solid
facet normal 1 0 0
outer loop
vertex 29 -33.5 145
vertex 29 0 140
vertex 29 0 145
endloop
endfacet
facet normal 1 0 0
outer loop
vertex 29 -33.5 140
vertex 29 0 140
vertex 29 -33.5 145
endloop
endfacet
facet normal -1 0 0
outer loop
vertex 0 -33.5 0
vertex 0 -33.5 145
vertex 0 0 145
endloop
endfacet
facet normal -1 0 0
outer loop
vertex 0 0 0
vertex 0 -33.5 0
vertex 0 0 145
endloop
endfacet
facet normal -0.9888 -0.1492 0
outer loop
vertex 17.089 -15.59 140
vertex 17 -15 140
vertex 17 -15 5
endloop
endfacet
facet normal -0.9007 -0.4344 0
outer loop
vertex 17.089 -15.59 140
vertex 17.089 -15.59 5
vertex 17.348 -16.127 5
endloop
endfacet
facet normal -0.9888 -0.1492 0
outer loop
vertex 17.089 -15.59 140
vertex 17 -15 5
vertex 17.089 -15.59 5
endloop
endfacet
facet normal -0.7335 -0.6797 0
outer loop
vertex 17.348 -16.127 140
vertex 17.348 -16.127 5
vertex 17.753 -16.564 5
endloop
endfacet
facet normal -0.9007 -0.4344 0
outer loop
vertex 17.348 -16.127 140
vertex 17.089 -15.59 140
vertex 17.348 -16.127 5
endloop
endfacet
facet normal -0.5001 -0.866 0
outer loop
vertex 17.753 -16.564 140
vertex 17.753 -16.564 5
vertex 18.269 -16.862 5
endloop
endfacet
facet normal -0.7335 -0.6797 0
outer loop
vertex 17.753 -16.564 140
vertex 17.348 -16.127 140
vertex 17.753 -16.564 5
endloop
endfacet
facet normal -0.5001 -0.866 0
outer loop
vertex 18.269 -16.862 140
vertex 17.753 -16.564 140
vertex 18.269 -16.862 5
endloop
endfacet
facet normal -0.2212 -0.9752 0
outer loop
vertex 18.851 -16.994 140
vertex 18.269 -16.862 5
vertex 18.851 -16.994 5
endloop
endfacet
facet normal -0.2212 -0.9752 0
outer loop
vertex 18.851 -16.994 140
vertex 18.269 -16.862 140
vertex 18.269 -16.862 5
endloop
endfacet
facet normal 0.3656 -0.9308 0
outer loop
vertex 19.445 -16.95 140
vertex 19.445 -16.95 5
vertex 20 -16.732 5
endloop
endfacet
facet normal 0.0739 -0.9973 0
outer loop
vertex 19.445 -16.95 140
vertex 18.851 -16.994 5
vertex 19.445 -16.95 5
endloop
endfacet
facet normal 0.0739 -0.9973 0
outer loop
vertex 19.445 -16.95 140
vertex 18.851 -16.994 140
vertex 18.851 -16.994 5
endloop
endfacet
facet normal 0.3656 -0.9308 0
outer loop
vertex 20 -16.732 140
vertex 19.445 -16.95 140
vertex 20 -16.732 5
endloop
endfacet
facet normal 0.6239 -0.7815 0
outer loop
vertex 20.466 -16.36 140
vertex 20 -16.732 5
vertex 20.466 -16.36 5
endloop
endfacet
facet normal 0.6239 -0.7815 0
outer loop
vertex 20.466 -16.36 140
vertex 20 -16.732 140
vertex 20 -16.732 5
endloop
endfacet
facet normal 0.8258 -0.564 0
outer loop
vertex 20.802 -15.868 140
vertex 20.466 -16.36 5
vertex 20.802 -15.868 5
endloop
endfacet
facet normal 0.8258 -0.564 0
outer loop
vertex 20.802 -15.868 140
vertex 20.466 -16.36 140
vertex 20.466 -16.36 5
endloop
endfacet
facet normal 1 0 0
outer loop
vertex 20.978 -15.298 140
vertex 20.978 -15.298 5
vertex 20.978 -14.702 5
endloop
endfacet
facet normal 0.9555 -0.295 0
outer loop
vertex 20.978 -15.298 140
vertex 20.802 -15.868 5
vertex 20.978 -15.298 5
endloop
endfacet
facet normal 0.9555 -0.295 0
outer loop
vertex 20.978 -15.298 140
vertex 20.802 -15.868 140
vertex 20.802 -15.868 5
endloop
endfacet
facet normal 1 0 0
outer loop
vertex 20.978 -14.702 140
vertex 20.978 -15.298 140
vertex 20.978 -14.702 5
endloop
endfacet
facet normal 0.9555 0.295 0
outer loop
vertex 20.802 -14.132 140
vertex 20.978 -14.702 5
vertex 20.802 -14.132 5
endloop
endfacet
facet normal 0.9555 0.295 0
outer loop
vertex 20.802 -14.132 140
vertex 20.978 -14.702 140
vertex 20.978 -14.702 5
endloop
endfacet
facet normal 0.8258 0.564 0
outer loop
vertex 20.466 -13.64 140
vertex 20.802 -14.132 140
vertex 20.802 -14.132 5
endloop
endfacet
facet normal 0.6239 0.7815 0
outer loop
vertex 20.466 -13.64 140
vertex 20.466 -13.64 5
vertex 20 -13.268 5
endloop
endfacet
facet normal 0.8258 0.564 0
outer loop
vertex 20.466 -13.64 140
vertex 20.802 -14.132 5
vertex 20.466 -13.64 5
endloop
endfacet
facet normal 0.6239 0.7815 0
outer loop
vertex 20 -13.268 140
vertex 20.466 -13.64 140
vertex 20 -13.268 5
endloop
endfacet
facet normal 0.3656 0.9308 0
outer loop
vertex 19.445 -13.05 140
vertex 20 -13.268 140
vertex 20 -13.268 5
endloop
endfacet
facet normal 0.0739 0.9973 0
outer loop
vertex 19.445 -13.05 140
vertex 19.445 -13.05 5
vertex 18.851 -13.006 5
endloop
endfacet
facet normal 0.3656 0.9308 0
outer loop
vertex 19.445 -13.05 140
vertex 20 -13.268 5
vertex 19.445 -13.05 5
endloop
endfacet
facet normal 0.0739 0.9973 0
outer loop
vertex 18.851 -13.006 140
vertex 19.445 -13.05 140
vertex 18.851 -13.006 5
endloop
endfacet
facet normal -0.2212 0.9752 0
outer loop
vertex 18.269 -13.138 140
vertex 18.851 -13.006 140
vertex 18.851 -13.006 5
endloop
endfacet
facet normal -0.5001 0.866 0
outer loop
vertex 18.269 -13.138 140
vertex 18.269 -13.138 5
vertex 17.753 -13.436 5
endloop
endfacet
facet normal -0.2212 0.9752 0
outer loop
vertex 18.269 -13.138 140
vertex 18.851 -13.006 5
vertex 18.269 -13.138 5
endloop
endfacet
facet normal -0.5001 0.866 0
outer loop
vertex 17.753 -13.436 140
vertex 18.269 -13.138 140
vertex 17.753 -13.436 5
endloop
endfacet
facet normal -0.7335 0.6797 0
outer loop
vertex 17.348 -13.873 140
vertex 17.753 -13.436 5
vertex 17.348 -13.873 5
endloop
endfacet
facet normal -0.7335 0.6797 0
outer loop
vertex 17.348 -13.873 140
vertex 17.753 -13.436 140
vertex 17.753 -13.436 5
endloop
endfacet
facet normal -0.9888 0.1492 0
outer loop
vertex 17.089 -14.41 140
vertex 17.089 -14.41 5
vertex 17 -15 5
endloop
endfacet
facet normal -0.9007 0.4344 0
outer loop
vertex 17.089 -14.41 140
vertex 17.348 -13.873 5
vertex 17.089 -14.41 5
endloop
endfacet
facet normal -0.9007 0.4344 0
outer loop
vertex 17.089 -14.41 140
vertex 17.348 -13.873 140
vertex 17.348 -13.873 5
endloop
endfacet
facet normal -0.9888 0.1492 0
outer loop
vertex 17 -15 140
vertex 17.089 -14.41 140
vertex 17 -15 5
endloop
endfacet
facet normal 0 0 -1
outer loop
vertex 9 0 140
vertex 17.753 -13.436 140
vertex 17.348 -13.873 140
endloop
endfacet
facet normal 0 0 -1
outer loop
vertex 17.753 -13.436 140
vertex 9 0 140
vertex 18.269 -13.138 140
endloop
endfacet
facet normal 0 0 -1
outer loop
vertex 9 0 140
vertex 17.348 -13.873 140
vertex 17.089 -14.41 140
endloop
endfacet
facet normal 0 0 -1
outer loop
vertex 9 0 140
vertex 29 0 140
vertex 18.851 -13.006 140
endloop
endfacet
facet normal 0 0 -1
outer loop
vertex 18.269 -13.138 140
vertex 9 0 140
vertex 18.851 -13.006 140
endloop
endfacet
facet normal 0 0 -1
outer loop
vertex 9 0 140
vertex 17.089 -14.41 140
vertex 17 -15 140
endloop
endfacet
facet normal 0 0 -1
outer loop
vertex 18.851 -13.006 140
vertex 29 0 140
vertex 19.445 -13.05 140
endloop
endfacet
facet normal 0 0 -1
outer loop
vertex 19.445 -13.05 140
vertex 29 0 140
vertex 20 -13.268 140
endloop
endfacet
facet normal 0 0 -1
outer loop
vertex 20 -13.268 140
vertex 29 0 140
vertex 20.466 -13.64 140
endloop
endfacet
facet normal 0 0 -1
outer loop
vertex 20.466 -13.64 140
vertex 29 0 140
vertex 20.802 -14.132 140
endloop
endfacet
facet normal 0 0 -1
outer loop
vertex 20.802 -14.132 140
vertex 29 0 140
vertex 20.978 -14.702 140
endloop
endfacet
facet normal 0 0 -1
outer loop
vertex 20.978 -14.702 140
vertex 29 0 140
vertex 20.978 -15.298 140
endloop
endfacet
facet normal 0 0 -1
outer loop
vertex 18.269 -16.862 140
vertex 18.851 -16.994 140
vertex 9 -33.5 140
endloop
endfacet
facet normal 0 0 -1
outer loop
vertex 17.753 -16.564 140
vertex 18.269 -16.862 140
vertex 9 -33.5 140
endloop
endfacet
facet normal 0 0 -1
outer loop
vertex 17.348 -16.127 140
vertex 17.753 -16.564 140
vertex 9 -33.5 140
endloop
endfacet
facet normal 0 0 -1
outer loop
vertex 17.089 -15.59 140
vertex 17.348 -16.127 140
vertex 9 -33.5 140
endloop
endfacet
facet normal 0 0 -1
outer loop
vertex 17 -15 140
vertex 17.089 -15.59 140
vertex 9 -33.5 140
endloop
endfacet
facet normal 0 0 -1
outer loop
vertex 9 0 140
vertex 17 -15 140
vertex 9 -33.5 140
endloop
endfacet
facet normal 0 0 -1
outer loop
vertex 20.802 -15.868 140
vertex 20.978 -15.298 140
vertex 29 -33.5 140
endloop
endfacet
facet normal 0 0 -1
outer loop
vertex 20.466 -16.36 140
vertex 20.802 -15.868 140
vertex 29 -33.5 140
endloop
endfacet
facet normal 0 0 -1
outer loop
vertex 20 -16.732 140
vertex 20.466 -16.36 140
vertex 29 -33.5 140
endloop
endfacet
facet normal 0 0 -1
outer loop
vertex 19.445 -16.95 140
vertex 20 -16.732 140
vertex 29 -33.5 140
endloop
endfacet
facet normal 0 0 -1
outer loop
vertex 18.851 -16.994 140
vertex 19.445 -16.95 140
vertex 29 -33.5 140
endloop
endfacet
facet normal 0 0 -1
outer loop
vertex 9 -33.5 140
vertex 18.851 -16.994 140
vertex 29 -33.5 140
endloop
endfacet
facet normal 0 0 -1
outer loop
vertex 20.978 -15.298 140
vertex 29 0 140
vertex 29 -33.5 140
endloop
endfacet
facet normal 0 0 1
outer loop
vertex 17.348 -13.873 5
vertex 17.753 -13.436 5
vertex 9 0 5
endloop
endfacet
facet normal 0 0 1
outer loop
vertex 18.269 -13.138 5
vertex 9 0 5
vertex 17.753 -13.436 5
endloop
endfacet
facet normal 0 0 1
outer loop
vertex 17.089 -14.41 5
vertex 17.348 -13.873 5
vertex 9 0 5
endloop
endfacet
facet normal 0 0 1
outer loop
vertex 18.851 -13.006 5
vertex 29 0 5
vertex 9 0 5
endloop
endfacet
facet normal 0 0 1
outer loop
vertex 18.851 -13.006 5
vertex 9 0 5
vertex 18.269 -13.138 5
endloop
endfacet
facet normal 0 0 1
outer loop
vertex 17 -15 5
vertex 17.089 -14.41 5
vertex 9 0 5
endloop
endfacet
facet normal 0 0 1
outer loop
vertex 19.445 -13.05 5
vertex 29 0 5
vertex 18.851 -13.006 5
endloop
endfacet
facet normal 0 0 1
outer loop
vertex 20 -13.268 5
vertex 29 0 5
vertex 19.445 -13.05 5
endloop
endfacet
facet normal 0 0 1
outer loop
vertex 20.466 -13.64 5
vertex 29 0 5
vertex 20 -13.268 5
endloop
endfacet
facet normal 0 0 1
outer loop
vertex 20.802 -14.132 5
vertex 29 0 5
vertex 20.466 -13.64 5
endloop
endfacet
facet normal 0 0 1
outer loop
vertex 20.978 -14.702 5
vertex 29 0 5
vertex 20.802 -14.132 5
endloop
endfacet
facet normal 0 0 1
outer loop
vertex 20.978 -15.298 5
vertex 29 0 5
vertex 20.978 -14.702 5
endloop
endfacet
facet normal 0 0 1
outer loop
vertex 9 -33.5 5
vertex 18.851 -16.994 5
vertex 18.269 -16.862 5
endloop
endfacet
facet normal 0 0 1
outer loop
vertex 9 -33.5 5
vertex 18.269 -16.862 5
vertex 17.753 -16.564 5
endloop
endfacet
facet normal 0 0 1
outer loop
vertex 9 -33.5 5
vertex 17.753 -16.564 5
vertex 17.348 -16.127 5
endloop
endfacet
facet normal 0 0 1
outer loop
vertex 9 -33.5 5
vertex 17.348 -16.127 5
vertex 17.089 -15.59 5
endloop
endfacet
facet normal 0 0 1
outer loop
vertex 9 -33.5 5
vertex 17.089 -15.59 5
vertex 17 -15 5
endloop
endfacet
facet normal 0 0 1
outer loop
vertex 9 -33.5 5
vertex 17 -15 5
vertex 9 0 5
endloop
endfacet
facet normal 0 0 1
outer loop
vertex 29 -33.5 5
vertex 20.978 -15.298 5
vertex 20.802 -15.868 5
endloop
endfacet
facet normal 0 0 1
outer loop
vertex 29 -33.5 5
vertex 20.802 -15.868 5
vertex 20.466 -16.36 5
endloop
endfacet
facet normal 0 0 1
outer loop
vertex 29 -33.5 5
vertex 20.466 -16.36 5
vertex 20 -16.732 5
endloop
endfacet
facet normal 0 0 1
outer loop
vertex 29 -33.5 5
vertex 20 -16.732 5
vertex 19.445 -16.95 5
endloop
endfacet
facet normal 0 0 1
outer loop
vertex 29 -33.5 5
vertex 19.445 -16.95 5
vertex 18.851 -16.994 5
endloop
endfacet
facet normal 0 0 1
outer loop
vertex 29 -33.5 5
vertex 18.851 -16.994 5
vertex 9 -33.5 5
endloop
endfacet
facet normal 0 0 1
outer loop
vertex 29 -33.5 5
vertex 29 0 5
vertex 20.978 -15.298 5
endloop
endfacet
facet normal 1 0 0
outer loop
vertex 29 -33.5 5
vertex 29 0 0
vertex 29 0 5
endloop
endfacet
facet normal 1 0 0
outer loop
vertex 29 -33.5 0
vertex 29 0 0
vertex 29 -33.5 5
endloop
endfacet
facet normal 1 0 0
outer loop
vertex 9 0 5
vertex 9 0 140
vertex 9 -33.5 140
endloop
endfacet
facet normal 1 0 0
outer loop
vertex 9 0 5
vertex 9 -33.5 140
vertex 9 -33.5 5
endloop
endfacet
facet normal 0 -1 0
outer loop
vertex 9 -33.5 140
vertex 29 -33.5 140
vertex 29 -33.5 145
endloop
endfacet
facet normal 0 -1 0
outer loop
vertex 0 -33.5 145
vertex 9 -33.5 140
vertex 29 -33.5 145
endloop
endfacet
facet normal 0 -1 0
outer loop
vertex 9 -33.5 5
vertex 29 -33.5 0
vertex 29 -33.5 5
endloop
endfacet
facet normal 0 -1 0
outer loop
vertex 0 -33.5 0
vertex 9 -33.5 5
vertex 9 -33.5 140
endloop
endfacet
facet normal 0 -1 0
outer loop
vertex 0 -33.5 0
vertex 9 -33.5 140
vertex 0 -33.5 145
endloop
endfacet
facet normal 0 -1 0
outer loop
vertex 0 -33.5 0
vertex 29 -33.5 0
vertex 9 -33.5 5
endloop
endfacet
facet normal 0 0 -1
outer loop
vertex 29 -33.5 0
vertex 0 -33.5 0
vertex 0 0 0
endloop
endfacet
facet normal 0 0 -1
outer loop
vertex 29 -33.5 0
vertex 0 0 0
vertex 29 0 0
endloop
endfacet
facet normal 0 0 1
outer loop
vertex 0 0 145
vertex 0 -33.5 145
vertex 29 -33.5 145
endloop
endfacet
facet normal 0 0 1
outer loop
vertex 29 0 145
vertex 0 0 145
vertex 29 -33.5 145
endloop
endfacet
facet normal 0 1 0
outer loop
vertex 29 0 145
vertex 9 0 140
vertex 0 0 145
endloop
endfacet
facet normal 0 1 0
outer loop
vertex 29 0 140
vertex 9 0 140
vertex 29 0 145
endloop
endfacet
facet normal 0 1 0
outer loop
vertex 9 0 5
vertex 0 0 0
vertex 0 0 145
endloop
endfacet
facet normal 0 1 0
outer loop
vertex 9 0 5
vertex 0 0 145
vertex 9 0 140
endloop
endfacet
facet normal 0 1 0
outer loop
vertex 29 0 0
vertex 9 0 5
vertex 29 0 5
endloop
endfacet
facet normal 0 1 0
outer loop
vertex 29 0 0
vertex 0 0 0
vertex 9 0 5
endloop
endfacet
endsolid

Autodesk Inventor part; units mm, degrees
ref_plane "YZ Plane" through (0, 0, 0) normal (1, 0, 0) x (0, 1, 0)
ref_plane "XZ Plane" through (0, 0, 0) normal (0, 1, 0) x (-1, 0, 0)
ref_plane "XY Plane" through (0, 0, 0) normal (0, 0, 1) x (1, 0, 0)
sketch "스케치1" plane through (0, 0, 0) normal (0, 0, 1) x (1, 0, 0)
  line L0 (0, 0) -> (29, 0)
  line L1 (29, 0) -> (29, -33.5)
  line L2 (29, -33.5) -> (0, -33.5)
  line L3 (0, -33.5) -> (0, 0)
  dimension "d0" = 29
  dimension "d1" = 33.5
extrude "돌출1" add sketch "스케치1" along normal blind 145
sketch "스케치2" plane through (29, -33.5, 0) normal (1, 0, 0) x (0, 0, -1)
  line L0 (0, 0) -> (0, 33.5) projected
  line L1 (0, 33.5) -> (-145, 33.5) projected
  line L2 (-145, 0) -> (-145, 33.5) projected
  line L3 (0, 0) -> (-145, 0) projected
  line L4 (-140, 33.5) -> (-140, 0)
  line L5 (-5, 33.5) -> (-5, 0)
  dimension "d4" = 5
  dimension "d5" = 5
extrude "돌출2" cut sketch "스케치2" against normal blind 20 contours L3 L4 L1 L5
sketch "스케치3" plane through (29, -33.5, 140) normal (0, 0, -1) x (-1, 0, 0)
  line L0 (0, 0) -> (0, 33.5) projected
  line L1 (20, 0) -> (0, 0) projected
  line L2 (20, 0) -> (20, 33.5) projected
  line L3 (0, 33.5) -> (20, 33.5) projected
  circle A0 centre (10, 18.5) radius 2
  point P0 (29, 33.5)
  dimension "d8" = 4
  dimension "d9" = 10
  dimension "d10" = 18.5
extrude "돌출3" add sketch "스케치3" along normal up to surface (135 mm away) contours A0
properties part number "linear_motor"
